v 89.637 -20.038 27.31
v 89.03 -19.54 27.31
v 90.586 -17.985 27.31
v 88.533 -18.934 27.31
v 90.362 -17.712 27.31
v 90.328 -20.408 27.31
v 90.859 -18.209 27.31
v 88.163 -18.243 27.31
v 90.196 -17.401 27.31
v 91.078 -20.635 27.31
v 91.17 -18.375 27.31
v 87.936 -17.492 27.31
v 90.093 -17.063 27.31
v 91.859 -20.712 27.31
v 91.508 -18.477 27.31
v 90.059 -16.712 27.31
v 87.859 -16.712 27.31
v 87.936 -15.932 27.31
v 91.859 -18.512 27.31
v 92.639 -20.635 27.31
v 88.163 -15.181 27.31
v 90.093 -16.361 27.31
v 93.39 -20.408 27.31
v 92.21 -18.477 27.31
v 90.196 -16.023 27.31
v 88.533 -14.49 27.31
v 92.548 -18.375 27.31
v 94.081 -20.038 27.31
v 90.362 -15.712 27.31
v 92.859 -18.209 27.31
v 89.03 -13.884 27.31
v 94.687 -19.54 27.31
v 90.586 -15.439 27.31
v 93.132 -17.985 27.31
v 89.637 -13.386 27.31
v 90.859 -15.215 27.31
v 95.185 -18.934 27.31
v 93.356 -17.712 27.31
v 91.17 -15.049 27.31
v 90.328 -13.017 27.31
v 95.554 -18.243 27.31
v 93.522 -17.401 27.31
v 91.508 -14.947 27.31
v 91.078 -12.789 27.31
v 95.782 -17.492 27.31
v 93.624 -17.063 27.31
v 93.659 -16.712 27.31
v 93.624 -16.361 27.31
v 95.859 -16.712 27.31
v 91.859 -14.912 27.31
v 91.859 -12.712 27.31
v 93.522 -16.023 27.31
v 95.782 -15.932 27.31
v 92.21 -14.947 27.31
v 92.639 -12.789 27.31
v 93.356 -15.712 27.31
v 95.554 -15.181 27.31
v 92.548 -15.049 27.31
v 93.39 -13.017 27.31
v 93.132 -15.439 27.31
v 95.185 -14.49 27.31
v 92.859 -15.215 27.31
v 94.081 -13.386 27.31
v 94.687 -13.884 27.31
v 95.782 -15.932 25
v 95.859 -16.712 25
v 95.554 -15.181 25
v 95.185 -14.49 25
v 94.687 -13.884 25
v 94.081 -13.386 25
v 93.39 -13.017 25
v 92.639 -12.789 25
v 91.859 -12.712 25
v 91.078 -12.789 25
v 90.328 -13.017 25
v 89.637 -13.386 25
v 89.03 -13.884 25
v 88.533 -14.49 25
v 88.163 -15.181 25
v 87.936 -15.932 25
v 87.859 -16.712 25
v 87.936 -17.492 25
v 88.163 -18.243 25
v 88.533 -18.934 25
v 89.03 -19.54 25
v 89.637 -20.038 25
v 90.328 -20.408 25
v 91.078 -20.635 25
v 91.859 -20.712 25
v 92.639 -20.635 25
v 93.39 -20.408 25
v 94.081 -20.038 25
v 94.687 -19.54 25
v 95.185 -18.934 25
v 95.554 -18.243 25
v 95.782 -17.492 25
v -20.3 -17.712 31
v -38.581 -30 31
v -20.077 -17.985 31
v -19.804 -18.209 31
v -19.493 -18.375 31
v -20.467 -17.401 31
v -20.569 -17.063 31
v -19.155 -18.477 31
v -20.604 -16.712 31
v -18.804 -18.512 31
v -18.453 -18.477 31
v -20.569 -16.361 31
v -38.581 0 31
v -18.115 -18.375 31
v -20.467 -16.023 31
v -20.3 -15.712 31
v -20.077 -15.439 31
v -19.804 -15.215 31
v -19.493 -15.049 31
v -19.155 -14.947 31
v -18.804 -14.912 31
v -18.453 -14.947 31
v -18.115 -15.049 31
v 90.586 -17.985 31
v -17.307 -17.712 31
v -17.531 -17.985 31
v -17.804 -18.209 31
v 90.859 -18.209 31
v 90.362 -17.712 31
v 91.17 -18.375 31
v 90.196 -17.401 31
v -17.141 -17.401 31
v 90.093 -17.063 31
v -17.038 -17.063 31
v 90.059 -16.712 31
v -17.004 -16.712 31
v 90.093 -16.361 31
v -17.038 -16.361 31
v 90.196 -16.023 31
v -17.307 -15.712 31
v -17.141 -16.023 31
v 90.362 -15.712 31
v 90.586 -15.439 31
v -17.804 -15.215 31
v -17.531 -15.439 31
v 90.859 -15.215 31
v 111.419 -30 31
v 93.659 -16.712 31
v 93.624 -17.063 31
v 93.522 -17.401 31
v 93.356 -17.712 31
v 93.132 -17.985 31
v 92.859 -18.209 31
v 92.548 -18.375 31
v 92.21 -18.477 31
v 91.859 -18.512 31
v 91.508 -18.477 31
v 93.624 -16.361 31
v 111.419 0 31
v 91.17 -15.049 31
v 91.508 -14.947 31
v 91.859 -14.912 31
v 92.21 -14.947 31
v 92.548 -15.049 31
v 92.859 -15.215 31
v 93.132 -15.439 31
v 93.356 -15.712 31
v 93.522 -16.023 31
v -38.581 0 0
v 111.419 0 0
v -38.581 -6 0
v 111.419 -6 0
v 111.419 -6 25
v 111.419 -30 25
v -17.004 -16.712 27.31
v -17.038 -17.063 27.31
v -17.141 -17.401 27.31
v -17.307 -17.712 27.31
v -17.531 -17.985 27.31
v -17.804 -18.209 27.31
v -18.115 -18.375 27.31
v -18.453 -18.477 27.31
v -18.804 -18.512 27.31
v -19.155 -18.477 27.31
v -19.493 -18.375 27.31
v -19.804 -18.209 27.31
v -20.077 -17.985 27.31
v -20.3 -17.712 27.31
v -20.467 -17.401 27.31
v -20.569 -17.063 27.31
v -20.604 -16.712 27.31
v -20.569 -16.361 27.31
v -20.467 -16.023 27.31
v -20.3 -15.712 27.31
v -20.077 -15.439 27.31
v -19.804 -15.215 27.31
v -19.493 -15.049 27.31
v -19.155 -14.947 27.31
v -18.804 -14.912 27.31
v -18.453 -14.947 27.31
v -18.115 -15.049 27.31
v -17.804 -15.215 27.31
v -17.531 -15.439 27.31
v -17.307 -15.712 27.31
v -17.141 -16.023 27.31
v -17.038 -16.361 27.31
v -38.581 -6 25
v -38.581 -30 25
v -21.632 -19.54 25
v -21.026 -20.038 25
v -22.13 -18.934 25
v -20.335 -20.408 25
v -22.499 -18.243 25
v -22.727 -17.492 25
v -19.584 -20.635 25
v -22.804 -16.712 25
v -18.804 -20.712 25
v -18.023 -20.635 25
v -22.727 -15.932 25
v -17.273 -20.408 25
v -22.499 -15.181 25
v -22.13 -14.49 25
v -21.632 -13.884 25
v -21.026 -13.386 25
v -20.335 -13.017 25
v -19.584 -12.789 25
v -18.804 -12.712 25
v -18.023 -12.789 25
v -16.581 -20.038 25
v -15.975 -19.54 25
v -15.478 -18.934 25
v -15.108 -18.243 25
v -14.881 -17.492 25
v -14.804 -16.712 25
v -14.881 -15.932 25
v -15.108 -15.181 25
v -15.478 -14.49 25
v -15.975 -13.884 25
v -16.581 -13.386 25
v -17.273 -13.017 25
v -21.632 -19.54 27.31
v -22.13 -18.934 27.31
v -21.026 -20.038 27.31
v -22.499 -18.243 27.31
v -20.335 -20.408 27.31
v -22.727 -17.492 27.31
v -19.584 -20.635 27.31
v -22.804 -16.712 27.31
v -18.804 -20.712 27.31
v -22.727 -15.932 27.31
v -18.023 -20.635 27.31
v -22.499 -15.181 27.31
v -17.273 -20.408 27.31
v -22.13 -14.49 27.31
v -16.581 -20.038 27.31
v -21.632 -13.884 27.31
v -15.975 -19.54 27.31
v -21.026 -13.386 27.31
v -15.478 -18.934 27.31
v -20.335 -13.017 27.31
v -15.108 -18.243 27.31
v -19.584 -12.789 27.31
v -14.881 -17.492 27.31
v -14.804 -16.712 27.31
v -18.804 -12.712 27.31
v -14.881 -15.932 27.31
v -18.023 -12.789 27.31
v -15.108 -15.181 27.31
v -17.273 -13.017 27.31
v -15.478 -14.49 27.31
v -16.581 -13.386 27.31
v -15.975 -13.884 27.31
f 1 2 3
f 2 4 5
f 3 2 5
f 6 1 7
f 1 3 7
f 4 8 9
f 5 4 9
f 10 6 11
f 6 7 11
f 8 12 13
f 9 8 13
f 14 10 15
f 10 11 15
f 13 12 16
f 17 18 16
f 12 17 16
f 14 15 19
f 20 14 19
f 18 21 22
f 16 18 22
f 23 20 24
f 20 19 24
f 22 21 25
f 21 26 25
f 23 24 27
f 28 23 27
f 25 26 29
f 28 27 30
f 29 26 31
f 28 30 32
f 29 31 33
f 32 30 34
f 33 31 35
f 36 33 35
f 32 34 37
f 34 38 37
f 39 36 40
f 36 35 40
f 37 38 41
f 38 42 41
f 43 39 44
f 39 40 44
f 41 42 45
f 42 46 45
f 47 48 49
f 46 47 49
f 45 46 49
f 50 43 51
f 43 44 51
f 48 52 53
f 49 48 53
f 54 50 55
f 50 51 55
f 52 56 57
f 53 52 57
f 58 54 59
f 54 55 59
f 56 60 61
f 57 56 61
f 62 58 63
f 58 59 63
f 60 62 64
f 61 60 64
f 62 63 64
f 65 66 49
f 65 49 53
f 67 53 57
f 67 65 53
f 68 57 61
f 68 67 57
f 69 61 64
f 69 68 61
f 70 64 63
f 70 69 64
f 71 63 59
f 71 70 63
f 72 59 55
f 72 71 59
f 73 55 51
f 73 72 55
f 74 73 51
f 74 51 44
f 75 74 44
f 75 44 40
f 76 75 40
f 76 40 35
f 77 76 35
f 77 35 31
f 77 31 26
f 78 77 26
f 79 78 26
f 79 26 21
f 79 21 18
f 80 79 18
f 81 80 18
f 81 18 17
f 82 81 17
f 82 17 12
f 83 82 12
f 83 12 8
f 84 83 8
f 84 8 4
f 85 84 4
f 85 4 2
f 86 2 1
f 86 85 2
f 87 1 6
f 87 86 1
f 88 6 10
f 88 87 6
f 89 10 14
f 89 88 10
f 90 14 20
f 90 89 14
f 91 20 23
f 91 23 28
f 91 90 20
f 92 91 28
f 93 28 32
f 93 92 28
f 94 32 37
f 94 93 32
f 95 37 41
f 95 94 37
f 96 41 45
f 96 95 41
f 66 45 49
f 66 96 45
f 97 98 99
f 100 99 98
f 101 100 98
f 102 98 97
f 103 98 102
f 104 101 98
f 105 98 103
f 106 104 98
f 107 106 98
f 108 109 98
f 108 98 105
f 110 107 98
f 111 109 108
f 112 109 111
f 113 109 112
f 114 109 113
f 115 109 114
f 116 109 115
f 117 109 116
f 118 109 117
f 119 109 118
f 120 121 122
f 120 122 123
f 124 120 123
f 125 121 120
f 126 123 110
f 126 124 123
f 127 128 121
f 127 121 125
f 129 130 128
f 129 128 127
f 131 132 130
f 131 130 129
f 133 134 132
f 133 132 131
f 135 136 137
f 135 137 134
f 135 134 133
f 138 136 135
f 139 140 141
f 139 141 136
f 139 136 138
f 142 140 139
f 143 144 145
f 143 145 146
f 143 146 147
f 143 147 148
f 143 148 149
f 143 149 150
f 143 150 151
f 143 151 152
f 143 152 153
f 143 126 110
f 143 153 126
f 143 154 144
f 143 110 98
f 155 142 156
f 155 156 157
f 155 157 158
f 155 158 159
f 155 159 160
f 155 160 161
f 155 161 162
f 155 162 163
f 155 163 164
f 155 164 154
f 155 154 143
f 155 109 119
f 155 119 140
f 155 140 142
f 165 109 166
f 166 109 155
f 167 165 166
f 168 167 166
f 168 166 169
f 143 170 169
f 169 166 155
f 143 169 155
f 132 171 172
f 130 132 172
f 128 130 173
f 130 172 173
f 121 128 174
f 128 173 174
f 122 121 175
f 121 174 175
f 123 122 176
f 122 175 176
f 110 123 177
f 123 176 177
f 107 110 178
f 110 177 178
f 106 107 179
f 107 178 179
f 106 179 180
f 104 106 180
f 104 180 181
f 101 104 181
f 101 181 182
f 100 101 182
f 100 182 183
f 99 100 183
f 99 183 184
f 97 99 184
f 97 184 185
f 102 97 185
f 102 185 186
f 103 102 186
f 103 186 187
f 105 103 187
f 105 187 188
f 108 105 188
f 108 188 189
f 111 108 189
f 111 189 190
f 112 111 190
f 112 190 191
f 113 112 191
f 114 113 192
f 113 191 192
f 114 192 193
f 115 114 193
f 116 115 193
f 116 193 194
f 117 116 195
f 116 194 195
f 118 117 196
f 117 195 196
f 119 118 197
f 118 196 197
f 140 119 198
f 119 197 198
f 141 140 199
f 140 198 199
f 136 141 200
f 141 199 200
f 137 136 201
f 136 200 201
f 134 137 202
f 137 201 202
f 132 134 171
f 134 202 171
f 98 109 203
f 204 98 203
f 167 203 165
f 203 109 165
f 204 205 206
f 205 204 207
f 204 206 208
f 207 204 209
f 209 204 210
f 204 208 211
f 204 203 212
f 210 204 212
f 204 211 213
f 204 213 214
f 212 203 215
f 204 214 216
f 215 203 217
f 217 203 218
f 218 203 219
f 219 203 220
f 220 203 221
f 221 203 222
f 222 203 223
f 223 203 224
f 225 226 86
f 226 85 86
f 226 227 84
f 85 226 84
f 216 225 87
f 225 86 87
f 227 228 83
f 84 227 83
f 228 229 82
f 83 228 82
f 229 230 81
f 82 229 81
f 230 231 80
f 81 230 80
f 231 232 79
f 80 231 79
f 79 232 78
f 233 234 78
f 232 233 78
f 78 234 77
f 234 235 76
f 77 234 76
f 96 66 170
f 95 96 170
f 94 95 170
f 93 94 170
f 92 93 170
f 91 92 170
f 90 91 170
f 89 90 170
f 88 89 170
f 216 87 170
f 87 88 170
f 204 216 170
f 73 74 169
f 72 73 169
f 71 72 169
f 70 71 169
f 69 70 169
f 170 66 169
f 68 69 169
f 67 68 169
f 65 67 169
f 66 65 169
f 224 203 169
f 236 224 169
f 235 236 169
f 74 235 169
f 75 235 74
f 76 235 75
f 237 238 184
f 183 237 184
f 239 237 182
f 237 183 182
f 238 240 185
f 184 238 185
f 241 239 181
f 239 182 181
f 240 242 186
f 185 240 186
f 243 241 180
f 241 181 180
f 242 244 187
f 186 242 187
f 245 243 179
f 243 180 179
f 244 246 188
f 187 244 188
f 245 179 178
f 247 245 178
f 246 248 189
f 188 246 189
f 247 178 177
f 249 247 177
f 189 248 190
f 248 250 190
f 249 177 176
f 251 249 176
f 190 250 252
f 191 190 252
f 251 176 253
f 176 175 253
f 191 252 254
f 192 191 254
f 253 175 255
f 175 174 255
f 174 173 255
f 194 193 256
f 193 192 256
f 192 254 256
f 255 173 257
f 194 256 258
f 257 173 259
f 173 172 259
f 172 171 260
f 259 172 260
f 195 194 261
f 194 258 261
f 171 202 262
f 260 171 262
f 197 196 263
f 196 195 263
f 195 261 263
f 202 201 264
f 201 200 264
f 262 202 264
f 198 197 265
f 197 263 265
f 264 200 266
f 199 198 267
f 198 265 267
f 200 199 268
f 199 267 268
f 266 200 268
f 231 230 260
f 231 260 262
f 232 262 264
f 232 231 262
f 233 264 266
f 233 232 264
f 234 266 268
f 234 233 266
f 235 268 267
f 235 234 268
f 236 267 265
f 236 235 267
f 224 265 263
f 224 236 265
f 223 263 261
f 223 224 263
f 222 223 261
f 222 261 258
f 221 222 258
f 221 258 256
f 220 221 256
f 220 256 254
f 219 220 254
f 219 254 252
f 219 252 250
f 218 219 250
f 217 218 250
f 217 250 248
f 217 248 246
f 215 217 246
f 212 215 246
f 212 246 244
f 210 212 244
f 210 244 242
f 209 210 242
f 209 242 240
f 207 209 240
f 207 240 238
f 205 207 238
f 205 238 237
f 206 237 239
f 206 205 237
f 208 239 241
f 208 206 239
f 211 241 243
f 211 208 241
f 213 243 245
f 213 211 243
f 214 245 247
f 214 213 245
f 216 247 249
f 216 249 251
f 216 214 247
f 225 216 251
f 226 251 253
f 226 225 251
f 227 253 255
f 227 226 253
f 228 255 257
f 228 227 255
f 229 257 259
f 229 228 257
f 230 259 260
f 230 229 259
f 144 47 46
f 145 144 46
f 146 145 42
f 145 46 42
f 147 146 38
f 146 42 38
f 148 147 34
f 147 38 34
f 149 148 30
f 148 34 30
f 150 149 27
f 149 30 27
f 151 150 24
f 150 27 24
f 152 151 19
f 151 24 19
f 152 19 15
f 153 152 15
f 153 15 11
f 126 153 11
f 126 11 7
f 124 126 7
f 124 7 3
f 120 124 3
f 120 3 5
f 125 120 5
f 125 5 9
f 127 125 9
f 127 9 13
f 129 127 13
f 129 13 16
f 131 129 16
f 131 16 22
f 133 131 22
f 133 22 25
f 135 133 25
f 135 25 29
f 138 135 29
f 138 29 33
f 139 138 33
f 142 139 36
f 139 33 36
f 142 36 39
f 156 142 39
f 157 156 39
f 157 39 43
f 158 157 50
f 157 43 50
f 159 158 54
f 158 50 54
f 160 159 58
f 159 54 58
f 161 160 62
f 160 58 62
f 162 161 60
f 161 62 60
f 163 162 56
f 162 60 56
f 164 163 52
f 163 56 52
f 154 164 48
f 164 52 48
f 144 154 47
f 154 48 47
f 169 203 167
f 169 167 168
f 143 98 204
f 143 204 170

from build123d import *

# Parameters (mm, degrees)
F0_W     = 150
F0_H     = 25
F0_H_2   = 6
F1_DEPTH = 6
F2_DEPTH = 30
F3_R     = 4
F3_R_2   = 1.8
F4_DEPTH = 27.31
F5_DEPTH = 25


with BuildPart() as f1:
    # F0 (on Front) → F1 (new body)
    with BuildSketch(Plane.XZ):
        with Locations((36.419376108, 12.5)):
            Rectangle(F0_W, F0_H)
        with Locations((36.419376108, 28)):
            Rectangle(F0_W, F0_H_2)
    extrude(amount=F1_DEPTH)

    # F0 (on Front) → F2 (join)
    with BuildSketch(Plane.XZ):
        with Locations((36.419376108, 28)):
            Rectangle(F0_W, F0_H_2)
    extrude(amount=F2_DEPTH)

    # F3 (on Top) → F4 (cut)
    with BuildSketch(Plane.XY):
        with Locations((91.85885638, -16.7120620608)):
            Circle(F3_R)
        with Locations((91.8588588197, -16.7120620608)):
            Circle(F3_R_2, mode=Mode.SUBTRACT)
        with Locations((-18.8037762601, -16.7120620608)):
            Circle(F3_R)
        with Locations((-18.8037762601, -16.7120620608)):
            Circle(F3_R_2, mode=Mode.SUBTRACT)
    extrude(amount=F4_DEPTH, mode=Mode.SUBTRACT)

    # F5 (cut): faces of the model
    f5_faces = [f1.faces().sort_by_distance(p)[0] for p in [
        (-18.8037762601, -16.7120620608, 25),
        (91.8588588197, -16.7120620608, 25),
    ]]
    extrude(f5_faces, amount=-F5_DEPTH, mode=Mode.SUBTRACT)


solid = f1.part
